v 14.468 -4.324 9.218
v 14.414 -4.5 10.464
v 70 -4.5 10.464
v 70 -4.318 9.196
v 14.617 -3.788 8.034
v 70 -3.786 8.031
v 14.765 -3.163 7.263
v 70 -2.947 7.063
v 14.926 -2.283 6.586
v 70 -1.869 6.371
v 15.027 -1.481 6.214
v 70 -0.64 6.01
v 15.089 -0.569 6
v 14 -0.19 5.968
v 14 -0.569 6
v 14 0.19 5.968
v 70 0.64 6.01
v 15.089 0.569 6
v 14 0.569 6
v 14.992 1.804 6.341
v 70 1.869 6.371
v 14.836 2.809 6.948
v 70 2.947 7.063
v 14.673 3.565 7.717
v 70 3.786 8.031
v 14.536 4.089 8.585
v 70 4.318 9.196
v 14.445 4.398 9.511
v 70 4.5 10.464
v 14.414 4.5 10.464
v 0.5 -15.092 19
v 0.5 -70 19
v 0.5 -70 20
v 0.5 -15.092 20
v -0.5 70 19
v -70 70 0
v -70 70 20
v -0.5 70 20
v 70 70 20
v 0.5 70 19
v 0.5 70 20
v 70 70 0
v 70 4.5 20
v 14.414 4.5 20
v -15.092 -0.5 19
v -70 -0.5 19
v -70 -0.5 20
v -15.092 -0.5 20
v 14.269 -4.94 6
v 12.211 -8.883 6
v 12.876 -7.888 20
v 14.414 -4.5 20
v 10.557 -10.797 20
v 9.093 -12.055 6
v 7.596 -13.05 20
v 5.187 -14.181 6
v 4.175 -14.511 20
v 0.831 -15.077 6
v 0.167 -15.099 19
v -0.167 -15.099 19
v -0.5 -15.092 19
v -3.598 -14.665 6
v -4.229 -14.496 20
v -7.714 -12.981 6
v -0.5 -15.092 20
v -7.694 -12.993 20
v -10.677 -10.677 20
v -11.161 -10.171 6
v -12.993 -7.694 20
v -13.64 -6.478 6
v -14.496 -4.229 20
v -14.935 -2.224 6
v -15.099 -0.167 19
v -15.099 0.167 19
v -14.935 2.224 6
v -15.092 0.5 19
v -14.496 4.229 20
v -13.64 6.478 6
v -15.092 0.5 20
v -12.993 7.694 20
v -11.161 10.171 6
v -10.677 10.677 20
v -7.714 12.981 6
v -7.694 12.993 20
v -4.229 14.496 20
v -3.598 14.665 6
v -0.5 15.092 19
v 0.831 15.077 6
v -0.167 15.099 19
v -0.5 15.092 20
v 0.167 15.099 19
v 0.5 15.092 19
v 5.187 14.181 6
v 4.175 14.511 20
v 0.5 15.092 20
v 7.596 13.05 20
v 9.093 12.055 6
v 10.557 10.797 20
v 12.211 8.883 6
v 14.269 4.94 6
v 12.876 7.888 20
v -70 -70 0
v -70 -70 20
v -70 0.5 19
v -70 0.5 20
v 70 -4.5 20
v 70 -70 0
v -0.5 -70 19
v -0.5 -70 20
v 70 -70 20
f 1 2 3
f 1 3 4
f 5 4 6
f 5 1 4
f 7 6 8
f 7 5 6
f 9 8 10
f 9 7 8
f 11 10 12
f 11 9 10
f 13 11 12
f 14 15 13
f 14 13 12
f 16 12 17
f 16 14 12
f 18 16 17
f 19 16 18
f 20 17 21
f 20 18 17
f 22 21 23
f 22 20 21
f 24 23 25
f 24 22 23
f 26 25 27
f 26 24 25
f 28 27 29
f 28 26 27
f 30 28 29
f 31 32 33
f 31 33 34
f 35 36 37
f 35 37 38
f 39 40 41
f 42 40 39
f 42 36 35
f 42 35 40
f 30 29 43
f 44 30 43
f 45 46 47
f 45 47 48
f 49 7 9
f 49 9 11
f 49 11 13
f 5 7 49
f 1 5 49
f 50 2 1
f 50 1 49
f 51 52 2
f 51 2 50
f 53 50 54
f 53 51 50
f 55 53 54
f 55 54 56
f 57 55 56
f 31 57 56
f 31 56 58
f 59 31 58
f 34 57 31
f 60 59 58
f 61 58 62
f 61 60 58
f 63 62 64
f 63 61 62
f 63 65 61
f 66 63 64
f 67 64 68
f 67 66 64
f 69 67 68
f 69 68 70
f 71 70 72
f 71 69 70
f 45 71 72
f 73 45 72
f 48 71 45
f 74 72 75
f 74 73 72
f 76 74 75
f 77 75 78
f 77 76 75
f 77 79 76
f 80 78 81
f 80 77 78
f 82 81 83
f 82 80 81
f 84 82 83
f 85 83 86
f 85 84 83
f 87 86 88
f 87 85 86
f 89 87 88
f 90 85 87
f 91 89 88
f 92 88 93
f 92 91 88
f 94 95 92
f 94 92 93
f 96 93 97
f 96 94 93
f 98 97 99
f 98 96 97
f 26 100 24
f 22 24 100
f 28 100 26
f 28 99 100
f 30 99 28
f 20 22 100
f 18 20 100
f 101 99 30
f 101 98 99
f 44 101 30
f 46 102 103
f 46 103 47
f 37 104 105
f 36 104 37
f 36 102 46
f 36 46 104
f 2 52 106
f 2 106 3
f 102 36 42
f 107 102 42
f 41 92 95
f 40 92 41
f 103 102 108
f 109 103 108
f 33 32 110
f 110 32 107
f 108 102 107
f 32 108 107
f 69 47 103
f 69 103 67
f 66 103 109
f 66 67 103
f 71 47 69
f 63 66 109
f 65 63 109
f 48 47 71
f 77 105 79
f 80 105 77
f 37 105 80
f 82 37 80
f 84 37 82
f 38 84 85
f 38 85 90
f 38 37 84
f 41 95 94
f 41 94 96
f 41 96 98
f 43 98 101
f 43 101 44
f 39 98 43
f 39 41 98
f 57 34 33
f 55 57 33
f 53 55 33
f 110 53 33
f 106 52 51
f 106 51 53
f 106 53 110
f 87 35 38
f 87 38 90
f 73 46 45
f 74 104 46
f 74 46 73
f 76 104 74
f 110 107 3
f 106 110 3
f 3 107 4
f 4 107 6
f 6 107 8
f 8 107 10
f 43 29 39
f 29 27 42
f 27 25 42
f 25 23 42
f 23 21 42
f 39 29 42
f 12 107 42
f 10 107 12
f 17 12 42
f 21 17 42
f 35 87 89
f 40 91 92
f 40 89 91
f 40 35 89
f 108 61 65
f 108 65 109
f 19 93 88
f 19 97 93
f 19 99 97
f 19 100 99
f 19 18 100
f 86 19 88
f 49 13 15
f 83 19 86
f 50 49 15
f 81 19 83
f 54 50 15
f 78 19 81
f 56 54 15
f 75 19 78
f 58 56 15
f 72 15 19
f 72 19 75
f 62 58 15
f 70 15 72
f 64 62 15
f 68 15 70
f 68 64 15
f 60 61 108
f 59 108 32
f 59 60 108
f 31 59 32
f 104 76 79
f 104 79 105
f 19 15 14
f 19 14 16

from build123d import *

# Parameters (mm, degrees)
F3_W     = 140
F3_H     = 140
F4_DEPTH = 20
F0_W     = 15.1
F0_H     = 14
F6_START = 14
F6_DEPTH = 136
F7_START = 19
F7_DEPTH = 6


with BuildPart() as f4:
    # F3 (on Top) → F4 (new body)
    with BuildSketch(Plane.XY):
        Rectangle(F3_W, F3_H)
    extrude(amount=F4_DEPTH)

    # F0 (on Front) → F5 (revolve, cut)
    with BuildSketch(Plane.XZ):
        with Locations((7.55, 13)):
            Rectangle(F0_W, F0_H)
    revolve(axis=Axis((0, 0, 13), (0, 0, -1)), mode=Mode.SUBTRACT)

    # F1 (on Right) → F6 (cut)
    with BuildSketch(Plane.YZ.offset(F6_START)):
        with BuildLine():
            Line((4.5, 20.4638522118), (0, 20.4638522118))
            Line((0, 20.4638522118), (-4.5, 20.4638522118))
            Line((-4.5, 20.4638522118), (-4.5, 10.4638522118))
            ThreePointArc((-4.5, 10.4638522118), (0, 5.9638522118), (4.5, 10.4638522118))
            Line((4.5, 10.4638522118), (4.5, 20.4638522118))
        make_face()
    extrude(amount=F6_DEPTH, mode=Mode.SUBTRACT)

    # F2 (on Top) → F7 (cut)
    with BuildSketch(Plane.XY.offset(F7_START)):
        Polygon((14, 0.5), (14, 0), (14, -0.5), (74, -0.5), (74, 0.5), align=None)
        Polygon((0.5, -14), (0, -14), (-0.5, -14), (-0.5, -74), (0.5, -74), align=None)
        Polygon((-13.9910685796, -0.5), (-13.9910685796, 0), (-13.9910685796, 0.5), (-73.9910685796, 0.5), (-73.9910685796, -0.5), align=None)
        Polygon((-0.5, 73.9972595498), (-0.5, 13.9972595498), (0, 13.9972595498), (0.5, 13.9972595498), (0.5, 73.9972595498), align=None)
    extrude(amount=F7_DEPTH, mode=Mode.SUBTRACT)


solid = f4.part
